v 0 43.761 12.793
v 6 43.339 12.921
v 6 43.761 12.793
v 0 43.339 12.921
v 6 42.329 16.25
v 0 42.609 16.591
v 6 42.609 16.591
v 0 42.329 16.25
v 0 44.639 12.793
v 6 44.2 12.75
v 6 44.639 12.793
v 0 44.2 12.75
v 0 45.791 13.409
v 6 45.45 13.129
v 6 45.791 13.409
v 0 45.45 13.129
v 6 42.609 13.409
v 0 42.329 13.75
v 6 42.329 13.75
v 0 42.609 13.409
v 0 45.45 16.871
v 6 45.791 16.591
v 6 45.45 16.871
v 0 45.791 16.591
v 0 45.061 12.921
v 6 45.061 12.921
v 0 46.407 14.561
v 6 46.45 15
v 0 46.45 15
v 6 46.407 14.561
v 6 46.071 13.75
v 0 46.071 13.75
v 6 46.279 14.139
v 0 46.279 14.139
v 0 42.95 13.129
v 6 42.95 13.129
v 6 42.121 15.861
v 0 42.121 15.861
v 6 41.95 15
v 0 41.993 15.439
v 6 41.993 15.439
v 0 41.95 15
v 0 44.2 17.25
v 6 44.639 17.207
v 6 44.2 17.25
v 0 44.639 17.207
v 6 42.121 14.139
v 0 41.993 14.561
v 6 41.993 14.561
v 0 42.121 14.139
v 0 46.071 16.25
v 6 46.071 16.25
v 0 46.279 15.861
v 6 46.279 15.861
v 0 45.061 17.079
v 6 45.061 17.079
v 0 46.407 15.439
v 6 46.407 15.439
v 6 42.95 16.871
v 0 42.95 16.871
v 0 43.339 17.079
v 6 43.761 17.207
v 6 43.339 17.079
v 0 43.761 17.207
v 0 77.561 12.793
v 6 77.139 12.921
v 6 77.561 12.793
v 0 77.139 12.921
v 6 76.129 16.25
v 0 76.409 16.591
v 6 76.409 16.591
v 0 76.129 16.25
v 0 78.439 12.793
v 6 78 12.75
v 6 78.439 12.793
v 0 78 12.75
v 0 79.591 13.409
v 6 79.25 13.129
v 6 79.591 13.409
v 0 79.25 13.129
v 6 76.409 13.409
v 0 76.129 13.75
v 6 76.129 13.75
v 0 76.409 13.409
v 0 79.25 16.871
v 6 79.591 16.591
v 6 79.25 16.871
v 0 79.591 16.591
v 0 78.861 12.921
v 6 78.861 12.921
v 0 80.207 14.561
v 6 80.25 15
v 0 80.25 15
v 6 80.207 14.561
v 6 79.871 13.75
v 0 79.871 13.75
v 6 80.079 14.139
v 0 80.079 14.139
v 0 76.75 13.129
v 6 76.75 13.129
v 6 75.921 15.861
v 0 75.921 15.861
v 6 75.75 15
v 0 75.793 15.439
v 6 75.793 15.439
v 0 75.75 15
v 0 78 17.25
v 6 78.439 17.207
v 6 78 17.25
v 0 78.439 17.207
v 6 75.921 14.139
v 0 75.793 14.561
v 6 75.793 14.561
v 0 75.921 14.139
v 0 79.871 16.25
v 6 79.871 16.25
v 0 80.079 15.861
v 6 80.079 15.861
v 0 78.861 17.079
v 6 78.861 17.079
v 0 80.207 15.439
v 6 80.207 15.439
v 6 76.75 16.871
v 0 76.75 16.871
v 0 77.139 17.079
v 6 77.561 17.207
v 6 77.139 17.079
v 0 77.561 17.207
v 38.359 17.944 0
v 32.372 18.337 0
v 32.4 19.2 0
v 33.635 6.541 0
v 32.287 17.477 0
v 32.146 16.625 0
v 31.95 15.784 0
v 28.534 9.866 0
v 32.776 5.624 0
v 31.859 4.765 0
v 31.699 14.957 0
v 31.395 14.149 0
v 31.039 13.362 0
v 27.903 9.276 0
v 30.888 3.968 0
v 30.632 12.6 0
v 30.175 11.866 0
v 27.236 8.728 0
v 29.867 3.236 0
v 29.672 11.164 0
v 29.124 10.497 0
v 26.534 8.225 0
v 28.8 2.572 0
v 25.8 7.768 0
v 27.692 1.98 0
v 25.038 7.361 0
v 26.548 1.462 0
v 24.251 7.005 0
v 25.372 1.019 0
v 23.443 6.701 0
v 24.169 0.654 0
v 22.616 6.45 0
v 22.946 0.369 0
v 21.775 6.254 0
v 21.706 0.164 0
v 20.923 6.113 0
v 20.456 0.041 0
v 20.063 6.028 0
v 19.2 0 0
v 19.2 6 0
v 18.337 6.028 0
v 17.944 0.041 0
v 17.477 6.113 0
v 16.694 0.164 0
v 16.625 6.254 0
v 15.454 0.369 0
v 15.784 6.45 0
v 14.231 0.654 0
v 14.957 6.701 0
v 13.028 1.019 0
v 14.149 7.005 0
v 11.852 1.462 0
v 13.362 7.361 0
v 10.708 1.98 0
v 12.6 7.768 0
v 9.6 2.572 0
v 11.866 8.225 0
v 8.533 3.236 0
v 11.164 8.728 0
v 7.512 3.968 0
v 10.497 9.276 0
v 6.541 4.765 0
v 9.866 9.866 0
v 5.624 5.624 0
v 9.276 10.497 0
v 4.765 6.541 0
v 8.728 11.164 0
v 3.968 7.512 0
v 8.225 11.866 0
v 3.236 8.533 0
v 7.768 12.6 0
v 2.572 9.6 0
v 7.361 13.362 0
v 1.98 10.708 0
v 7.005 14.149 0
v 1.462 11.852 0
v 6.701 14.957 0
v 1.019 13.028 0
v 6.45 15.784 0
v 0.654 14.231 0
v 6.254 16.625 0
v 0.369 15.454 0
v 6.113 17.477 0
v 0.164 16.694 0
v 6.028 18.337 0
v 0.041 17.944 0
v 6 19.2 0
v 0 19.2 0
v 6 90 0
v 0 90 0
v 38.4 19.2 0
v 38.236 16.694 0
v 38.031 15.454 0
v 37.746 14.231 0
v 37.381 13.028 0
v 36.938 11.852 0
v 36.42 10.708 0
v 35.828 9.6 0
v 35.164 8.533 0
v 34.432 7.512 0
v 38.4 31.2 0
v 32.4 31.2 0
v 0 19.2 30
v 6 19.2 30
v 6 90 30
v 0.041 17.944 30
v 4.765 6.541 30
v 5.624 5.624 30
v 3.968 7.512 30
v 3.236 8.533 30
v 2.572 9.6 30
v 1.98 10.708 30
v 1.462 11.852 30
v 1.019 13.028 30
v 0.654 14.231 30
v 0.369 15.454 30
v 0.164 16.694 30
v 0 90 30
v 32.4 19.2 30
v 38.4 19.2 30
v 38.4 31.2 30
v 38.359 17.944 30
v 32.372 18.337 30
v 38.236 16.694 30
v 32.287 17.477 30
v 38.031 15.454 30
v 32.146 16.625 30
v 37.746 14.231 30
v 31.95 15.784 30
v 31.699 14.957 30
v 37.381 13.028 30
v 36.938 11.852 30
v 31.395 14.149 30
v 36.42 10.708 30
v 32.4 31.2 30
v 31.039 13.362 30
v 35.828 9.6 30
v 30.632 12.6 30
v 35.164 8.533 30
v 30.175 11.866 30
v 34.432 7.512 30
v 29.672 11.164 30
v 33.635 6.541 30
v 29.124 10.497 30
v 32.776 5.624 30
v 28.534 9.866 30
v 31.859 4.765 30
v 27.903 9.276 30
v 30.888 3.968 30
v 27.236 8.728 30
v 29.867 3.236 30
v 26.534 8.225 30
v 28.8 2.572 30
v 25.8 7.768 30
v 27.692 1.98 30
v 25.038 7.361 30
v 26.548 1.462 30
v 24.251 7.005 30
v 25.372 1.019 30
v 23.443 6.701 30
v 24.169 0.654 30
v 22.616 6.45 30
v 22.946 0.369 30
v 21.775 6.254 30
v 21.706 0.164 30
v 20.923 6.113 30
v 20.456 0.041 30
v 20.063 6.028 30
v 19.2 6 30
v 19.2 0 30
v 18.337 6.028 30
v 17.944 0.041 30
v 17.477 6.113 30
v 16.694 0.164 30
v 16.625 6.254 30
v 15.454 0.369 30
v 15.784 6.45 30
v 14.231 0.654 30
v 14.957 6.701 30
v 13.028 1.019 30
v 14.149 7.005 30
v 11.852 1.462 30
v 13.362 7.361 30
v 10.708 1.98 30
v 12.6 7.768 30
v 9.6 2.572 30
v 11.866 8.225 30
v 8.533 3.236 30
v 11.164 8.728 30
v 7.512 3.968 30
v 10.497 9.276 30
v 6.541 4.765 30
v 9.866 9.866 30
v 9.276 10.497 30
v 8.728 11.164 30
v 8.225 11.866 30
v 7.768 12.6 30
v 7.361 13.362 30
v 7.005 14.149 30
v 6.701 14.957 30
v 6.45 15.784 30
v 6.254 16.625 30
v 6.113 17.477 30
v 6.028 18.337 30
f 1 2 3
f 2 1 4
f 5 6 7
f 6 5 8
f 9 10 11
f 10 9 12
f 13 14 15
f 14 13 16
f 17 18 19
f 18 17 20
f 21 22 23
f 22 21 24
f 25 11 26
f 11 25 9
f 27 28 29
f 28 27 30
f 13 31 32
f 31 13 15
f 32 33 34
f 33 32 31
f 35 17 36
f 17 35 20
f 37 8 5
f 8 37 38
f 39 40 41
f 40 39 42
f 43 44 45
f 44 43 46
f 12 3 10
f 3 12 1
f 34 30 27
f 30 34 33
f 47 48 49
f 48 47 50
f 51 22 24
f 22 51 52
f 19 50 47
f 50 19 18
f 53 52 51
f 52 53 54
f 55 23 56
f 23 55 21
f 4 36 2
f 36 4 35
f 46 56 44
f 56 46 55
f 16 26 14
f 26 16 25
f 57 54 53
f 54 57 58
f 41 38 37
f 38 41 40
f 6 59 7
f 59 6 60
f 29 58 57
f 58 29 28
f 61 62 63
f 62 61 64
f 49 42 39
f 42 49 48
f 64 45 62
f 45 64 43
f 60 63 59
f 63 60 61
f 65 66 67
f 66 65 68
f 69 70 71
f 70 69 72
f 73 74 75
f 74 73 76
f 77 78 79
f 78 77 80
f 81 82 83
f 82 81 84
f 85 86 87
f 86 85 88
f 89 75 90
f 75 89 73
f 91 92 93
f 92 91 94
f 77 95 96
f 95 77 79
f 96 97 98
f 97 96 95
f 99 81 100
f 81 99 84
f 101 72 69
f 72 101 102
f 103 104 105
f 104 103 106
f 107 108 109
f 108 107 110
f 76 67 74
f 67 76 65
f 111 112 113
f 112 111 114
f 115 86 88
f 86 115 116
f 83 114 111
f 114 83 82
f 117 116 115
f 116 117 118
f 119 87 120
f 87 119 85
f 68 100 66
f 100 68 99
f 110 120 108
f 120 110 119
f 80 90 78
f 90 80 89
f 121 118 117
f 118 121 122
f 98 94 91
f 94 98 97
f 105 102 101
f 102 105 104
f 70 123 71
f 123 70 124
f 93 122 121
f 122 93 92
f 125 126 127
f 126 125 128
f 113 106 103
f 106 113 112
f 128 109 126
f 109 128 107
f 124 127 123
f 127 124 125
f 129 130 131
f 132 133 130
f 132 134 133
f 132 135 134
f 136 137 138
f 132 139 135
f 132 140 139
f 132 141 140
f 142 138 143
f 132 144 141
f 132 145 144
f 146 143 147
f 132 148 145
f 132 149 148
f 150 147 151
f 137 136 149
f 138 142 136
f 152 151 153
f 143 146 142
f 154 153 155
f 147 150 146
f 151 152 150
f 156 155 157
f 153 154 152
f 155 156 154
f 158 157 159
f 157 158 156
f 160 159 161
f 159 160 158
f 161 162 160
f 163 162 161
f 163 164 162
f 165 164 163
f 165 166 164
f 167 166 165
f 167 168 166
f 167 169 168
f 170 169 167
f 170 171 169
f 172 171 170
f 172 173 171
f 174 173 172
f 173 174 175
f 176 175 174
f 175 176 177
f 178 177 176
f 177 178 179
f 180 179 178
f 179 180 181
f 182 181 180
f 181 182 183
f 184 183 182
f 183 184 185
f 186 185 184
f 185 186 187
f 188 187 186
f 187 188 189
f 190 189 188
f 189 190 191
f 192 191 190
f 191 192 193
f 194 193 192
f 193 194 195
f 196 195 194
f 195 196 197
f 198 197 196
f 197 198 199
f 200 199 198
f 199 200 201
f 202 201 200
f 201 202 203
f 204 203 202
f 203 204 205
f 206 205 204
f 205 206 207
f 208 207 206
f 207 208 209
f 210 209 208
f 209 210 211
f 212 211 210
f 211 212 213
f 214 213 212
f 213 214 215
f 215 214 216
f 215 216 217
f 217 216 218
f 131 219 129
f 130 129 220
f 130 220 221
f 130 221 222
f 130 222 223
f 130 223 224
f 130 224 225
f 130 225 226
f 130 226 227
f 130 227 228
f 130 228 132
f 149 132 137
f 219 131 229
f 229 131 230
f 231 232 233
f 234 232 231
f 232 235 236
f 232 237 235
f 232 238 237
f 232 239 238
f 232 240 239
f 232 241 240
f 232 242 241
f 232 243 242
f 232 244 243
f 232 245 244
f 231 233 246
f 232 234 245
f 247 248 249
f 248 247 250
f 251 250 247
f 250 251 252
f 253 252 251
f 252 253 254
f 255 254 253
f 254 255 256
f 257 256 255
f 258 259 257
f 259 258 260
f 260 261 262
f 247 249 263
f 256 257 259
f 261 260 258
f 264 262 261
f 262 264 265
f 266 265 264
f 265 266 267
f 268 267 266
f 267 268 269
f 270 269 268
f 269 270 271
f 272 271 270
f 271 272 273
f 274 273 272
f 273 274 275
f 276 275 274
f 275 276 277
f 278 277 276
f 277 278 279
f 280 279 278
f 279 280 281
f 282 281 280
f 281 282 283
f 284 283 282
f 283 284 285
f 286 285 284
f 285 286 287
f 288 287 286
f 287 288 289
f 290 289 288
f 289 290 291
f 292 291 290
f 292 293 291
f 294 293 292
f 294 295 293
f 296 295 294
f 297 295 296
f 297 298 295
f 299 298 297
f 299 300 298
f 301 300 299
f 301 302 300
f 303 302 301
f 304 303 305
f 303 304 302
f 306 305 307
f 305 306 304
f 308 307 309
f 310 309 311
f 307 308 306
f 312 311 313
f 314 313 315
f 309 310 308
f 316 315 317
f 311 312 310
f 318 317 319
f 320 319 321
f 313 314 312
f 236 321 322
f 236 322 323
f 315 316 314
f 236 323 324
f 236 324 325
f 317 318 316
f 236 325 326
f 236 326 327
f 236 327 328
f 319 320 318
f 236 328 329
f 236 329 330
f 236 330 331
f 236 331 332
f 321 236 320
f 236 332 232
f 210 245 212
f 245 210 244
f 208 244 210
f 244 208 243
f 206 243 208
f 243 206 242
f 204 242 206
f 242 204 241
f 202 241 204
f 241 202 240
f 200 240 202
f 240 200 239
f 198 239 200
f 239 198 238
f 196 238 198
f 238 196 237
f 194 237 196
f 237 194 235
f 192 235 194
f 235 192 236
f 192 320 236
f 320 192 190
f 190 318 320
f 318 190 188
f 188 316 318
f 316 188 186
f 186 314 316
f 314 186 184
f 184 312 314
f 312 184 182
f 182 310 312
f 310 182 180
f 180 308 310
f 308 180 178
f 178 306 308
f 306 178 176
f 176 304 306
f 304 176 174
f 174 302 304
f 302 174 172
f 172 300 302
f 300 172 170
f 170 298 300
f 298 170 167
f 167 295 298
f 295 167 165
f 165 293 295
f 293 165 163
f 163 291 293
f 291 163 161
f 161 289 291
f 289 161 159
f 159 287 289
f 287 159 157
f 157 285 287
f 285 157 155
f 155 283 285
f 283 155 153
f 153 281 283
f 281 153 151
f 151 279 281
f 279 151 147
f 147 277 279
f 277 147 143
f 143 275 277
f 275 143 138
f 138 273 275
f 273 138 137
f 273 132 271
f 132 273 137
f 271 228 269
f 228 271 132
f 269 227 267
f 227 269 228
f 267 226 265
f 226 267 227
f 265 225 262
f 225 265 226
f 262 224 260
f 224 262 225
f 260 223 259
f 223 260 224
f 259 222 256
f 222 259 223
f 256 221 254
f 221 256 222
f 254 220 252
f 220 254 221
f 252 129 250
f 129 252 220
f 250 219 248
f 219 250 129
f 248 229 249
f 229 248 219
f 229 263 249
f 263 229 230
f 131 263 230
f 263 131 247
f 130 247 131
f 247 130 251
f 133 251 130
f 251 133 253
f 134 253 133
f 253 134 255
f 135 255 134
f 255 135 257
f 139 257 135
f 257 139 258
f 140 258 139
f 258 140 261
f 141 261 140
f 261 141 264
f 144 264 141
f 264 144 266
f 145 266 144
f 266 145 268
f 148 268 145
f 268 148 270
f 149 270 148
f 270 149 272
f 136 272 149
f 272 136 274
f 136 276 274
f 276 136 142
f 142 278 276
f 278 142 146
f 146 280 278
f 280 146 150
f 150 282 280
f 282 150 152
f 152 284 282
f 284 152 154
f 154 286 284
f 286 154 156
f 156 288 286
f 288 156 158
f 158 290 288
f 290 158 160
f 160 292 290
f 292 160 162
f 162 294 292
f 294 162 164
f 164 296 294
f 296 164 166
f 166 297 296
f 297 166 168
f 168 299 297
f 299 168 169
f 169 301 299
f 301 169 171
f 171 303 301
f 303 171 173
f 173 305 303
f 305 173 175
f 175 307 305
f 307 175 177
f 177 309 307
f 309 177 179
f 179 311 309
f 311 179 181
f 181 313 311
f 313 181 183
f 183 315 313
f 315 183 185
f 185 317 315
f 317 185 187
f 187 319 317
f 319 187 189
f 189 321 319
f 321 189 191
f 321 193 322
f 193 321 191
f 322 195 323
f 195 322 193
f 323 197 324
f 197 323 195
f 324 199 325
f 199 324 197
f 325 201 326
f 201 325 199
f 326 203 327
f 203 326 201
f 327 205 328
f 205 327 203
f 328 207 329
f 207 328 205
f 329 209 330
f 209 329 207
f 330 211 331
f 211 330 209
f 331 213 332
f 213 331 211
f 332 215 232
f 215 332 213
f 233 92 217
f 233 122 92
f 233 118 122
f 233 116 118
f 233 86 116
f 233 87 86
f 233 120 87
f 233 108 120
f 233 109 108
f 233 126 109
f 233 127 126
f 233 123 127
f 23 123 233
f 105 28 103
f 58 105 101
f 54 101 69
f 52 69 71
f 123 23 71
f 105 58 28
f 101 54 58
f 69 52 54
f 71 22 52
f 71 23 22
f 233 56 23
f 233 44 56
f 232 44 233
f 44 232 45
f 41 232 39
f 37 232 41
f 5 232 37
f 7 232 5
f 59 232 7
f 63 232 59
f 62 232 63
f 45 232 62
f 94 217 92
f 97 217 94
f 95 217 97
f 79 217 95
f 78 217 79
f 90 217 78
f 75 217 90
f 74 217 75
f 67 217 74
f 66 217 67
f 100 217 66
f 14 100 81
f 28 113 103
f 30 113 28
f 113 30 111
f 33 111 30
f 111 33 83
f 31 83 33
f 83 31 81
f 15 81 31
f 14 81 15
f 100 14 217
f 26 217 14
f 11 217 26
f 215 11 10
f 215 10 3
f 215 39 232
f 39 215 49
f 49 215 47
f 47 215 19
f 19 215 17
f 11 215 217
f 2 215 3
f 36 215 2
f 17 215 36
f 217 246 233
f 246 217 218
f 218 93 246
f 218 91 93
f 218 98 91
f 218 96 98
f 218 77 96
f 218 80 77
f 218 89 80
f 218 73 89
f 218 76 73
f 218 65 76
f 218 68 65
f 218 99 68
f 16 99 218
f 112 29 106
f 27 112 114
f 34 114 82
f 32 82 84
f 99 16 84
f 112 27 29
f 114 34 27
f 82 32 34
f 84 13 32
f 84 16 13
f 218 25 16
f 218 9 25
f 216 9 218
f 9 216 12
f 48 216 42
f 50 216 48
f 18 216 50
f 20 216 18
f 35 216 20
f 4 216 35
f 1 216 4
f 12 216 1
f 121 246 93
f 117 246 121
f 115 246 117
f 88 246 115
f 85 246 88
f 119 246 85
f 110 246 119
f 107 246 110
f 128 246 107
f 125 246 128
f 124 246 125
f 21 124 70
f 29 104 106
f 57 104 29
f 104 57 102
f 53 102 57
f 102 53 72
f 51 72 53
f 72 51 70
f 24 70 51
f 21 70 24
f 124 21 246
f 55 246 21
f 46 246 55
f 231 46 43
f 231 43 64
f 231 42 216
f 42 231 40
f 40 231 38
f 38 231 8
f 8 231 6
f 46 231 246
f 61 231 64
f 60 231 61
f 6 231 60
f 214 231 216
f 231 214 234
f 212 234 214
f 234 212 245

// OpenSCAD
// Wall hook for a 1 inch (25.4 mm) round dowel, 30 mm wide, two holes for #8 wood screws.
// Printed on its side: the profile is drawn in XY and extruded by the hook width.
rod_d = 25.4;
clear = 1.0;            // so the dowel drops in easily
width = 30;
t = 6;                  // bar thickness
back_h = 90;            // back plate height
tip_rise = 12;          // how far the tip rises above the cradle center
screw_d = 4.5;          // #8 wood screw clearance
ri = (rod_d + clear) / 2;
cx = t + ri;            // cradle center
cy = t + ri;
$fn = 96;

module profile() {
    // back plate
    translate([0, cy]) square([t, back_h - cy]);
    // lower half ring (the cradle)
    translate([cx, cy])
    difference() {
        circle(r = ri + t);
        circle(r = ri);
        translate([-(ri + t) - 1, 0]) square([2 * (ri + t) + 2, ri + t + 1]);
    }
    // tip
    translate([cx + ri, cy]) square([t, tip_rise]);
}

difference() {
    linear_extrude(width) profile();
    for (y = [cy + 25, back_h - 12])
        translate([-1, y, width / 2]) rotate([0, 90, 0]) cylinder(d = screw_d, h = t + 2, $fn = 32);
}
